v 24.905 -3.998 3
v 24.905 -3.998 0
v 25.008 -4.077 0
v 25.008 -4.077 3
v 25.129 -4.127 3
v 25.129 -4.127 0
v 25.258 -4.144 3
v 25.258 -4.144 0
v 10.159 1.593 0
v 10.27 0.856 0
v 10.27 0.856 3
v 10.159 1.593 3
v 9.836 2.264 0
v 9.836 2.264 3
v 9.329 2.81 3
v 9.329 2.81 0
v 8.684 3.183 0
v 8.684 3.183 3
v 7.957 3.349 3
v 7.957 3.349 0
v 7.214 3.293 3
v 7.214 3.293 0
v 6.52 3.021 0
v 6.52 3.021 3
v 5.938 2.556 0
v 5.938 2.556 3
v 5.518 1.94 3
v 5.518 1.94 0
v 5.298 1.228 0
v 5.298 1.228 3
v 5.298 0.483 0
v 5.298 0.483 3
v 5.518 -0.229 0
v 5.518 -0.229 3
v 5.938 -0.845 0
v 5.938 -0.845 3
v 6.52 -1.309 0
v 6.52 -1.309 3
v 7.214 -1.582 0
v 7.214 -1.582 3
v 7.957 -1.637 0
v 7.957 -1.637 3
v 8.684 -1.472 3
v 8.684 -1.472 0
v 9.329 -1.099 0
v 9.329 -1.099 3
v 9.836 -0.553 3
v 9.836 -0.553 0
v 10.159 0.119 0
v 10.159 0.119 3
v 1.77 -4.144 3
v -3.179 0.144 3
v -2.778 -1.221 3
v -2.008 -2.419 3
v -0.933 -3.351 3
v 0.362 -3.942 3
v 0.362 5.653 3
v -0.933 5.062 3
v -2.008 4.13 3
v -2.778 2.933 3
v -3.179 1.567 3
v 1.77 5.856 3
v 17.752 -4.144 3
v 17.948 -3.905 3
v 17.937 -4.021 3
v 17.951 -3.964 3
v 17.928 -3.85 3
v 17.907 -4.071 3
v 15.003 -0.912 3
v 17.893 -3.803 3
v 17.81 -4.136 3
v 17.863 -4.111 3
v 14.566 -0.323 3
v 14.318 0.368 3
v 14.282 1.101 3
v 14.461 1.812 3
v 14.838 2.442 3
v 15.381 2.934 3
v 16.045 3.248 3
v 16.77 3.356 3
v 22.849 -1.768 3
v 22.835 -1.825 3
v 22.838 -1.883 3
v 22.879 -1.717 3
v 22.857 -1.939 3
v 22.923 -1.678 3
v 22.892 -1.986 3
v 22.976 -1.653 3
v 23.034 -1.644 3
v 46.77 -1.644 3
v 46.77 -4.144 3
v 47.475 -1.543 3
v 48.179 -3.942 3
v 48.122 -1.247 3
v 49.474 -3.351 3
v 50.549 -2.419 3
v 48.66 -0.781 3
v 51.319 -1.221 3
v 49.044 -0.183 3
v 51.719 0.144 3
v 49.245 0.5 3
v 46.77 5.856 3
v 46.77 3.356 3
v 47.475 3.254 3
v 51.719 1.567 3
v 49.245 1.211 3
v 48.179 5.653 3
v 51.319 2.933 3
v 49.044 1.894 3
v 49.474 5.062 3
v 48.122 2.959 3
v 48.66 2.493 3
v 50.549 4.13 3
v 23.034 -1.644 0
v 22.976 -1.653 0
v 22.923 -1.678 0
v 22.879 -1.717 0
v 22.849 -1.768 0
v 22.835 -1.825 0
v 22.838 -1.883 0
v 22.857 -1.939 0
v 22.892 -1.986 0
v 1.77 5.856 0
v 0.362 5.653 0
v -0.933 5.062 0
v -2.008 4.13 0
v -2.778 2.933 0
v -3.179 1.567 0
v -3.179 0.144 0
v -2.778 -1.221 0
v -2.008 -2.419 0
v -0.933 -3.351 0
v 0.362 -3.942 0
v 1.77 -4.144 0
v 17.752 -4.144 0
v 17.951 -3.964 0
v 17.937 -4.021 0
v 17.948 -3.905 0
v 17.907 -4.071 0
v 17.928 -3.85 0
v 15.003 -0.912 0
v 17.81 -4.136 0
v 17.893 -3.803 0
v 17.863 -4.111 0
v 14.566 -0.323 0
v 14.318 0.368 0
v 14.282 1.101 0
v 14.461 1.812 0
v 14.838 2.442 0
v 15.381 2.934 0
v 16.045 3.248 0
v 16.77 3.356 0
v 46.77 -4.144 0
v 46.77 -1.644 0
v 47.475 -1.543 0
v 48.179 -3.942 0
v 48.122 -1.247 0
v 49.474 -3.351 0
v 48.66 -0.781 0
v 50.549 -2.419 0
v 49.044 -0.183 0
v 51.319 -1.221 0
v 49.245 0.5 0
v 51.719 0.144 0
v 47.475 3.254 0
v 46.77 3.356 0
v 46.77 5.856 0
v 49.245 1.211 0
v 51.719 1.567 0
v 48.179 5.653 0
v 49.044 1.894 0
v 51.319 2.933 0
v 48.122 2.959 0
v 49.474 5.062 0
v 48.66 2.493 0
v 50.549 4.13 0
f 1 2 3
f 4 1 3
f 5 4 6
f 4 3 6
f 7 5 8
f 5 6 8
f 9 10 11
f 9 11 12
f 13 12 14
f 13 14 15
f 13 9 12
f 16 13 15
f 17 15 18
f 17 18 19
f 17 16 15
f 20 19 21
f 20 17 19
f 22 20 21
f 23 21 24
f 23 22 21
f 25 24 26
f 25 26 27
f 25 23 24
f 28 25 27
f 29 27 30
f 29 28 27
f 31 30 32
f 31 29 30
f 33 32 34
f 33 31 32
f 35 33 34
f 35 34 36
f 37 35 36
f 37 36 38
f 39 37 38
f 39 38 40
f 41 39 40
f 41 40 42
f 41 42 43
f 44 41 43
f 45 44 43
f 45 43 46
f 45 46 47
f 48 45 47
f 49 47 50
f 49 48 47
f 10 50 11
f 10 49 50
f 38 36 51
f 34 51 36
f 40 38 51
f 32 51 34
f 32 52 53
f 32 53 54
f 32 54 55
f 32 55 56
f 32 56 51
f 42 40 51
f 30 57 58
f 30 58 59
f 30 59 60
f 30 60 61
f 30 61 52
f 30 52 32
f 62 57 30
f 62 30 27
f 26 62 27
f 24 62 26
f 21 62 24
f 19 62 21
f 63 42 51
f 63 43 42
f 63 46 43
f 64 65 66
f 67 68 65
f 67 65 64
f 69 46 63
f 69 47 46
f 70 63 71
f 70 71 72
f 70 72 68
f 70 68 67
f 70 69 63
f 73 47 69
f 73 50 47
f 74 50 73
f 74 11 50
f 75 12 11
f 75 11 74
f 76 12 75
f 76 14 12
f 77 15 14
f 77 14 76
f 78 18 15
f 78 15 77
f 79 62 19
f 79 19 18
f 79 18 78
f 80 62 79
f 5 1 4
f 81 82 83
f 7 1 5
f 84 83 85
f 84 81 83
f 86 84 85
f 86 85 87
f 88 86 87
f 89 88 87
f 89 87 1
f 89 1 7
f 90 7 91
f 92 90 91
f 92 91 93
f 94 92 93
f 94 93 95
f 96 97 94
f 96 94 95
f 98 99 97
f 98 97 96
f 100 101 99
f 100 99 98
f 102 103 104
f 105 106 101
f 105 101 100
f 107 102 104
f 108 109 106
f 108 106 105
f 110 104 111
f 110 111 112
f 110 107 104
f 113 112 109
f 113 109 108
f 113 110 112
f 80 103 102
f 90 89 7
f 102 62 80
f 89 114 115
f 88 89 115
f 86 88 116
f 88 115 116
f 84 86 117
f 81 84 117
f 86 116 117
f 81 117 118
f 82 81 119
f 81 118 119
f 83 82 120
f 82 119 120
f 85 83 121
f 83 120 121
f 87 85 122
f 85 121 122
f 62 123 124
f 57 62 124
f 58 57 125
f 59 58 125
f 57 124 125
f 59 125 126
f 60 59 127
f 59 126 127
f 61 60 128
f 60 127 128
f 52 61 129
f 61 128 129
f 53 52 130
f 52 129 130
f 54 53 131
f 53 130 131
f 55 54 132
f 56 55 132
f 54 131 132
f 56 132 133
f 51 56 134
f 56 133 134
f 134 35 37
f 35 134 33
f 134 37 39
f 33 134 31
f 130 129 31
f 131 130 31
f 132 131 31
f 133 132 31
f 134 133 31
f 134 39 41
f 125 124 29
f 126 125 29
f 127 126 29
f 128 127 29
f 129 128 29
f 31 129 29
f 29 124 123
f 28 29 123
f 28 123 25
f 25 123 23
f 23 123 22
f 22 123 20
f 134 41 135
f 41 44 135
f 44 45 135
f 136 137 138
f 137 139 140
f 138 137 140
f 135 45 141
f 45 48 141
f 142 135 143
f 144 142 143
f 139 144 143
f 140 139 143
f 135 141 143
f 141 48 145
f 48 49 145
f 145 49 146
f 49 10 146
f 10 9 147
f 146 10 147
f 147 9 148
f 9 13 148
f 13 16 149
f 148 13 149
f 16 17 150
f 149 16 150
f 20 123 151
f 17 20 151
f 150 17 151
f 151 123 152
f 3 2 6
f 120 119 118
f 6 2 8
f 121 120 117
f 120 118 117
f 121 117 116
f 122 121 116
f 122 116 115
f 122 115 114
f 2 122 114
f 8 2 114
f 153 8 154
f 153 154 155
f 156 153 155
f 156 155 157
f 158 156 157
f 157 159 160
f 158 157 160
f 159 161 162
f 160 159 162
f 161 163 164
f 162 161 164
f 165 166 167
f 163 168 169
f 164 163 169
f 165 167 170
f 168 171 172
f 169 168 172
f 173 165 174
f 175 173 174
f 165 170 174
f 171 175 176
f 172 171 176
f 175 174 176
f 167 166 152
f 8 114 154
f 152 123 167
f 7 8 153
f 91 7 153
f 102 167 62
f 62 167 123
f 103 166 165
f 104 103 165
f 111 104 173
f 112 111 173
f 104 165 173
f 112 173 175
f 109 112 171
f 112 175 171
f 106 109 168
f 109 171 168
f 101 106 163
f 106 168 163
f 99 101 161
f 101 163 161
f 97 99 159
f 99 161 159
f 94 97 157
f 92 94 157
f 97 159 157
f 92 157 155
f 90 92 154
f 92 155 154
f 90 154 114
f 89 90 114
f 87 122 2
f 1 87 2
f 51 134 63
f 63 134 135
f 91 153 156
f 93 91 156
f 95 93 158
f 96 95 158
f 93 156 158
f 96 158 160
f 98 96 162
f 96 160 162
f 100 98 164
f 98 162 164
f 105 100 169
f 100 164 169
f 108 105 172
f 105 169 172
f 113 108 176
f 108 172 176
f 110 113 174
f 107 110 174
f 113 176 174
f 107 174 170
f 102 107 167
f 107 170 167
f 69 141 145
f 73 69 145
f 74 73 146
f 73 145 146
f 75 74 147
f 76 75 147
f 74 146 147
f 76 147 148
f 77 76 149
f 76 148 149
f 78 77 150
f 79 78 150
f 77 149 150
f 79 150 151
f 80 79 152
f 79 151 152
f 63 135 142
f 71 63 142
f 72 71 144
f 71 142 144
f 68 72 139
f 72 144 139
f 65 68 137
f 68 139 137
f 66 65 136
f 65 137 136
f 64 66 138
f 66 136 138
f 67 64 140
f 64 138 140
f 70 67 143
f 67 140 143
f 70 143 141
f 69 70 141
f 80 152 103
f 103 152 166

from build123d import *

# Parameters (mm, degrees)
SKETCH2_R           = 2.5
BOSS_EXTRUDE1_DEPTH = 3


with BuildPart() as part:
    # Sketch2 → Boss-Extrude1 (new body)
    with BuildSketch(Plane.XY):
        with BuildLine():
            Line((16.770370099, 3.355657737), (46.770370099, 3.355657737))
            ThreePointArc((46.770370099, 3.355657737), (49.270370099, 0.855657737), (46.770370099, -1.644342263))
            Line((46.770370099, -1.644342263), (23.033866759, -1.644342263))
            ThreePointArc((23.033866759, -1.644342263), (22.849090853, -1.767805576), (22.892445403, -1.985763619))
            Line((22.892445403, -1.985763619), (24.904577438, -3.997895654))
            ThreePointArc((24.904577438, -3.997895654), (25.066789112, -4.106282029), (25.258130828, -4.144342263))
            Line((25.258130828, -4.144342263), (46.770370099, -4.144342263))
            ThreePointArc((46.770370099, -4.144342263), (51.770370099, 0.855657737), (46.770370099, 5.855657737))
            Line((46.770370099, 5.855657737), (1.770370099, 5.855657737))
            ThreePointArc((1.770370099, 5.855657737), (-3.229629901, 0.855657737), (1.770370099, -4.144342263))
            Line((1.770370099, -4.144342263), (17.75199348, -4.144342263))
            ThreePointArc((17.75199348, -4.144342263), (17.936769387, -4.020878949), (17.893414837, -3.802920907))
            Line((17.893414837, -3.802920907), (15.002603146, -0.912109216))
            ThreePointArc((15.002603146, -0.912109216), (14.460671268, 1.812366318), (16.770370099, 3.355657737))
        make_face()
        with Locations((7.770370099, 0.855657737)):
            Circle(SKETCH2_R, mode=Mode.SUBTRACT)
    extrude(amount=BOSS_EXTRUDE1_DEPTH)


solid = part.part
